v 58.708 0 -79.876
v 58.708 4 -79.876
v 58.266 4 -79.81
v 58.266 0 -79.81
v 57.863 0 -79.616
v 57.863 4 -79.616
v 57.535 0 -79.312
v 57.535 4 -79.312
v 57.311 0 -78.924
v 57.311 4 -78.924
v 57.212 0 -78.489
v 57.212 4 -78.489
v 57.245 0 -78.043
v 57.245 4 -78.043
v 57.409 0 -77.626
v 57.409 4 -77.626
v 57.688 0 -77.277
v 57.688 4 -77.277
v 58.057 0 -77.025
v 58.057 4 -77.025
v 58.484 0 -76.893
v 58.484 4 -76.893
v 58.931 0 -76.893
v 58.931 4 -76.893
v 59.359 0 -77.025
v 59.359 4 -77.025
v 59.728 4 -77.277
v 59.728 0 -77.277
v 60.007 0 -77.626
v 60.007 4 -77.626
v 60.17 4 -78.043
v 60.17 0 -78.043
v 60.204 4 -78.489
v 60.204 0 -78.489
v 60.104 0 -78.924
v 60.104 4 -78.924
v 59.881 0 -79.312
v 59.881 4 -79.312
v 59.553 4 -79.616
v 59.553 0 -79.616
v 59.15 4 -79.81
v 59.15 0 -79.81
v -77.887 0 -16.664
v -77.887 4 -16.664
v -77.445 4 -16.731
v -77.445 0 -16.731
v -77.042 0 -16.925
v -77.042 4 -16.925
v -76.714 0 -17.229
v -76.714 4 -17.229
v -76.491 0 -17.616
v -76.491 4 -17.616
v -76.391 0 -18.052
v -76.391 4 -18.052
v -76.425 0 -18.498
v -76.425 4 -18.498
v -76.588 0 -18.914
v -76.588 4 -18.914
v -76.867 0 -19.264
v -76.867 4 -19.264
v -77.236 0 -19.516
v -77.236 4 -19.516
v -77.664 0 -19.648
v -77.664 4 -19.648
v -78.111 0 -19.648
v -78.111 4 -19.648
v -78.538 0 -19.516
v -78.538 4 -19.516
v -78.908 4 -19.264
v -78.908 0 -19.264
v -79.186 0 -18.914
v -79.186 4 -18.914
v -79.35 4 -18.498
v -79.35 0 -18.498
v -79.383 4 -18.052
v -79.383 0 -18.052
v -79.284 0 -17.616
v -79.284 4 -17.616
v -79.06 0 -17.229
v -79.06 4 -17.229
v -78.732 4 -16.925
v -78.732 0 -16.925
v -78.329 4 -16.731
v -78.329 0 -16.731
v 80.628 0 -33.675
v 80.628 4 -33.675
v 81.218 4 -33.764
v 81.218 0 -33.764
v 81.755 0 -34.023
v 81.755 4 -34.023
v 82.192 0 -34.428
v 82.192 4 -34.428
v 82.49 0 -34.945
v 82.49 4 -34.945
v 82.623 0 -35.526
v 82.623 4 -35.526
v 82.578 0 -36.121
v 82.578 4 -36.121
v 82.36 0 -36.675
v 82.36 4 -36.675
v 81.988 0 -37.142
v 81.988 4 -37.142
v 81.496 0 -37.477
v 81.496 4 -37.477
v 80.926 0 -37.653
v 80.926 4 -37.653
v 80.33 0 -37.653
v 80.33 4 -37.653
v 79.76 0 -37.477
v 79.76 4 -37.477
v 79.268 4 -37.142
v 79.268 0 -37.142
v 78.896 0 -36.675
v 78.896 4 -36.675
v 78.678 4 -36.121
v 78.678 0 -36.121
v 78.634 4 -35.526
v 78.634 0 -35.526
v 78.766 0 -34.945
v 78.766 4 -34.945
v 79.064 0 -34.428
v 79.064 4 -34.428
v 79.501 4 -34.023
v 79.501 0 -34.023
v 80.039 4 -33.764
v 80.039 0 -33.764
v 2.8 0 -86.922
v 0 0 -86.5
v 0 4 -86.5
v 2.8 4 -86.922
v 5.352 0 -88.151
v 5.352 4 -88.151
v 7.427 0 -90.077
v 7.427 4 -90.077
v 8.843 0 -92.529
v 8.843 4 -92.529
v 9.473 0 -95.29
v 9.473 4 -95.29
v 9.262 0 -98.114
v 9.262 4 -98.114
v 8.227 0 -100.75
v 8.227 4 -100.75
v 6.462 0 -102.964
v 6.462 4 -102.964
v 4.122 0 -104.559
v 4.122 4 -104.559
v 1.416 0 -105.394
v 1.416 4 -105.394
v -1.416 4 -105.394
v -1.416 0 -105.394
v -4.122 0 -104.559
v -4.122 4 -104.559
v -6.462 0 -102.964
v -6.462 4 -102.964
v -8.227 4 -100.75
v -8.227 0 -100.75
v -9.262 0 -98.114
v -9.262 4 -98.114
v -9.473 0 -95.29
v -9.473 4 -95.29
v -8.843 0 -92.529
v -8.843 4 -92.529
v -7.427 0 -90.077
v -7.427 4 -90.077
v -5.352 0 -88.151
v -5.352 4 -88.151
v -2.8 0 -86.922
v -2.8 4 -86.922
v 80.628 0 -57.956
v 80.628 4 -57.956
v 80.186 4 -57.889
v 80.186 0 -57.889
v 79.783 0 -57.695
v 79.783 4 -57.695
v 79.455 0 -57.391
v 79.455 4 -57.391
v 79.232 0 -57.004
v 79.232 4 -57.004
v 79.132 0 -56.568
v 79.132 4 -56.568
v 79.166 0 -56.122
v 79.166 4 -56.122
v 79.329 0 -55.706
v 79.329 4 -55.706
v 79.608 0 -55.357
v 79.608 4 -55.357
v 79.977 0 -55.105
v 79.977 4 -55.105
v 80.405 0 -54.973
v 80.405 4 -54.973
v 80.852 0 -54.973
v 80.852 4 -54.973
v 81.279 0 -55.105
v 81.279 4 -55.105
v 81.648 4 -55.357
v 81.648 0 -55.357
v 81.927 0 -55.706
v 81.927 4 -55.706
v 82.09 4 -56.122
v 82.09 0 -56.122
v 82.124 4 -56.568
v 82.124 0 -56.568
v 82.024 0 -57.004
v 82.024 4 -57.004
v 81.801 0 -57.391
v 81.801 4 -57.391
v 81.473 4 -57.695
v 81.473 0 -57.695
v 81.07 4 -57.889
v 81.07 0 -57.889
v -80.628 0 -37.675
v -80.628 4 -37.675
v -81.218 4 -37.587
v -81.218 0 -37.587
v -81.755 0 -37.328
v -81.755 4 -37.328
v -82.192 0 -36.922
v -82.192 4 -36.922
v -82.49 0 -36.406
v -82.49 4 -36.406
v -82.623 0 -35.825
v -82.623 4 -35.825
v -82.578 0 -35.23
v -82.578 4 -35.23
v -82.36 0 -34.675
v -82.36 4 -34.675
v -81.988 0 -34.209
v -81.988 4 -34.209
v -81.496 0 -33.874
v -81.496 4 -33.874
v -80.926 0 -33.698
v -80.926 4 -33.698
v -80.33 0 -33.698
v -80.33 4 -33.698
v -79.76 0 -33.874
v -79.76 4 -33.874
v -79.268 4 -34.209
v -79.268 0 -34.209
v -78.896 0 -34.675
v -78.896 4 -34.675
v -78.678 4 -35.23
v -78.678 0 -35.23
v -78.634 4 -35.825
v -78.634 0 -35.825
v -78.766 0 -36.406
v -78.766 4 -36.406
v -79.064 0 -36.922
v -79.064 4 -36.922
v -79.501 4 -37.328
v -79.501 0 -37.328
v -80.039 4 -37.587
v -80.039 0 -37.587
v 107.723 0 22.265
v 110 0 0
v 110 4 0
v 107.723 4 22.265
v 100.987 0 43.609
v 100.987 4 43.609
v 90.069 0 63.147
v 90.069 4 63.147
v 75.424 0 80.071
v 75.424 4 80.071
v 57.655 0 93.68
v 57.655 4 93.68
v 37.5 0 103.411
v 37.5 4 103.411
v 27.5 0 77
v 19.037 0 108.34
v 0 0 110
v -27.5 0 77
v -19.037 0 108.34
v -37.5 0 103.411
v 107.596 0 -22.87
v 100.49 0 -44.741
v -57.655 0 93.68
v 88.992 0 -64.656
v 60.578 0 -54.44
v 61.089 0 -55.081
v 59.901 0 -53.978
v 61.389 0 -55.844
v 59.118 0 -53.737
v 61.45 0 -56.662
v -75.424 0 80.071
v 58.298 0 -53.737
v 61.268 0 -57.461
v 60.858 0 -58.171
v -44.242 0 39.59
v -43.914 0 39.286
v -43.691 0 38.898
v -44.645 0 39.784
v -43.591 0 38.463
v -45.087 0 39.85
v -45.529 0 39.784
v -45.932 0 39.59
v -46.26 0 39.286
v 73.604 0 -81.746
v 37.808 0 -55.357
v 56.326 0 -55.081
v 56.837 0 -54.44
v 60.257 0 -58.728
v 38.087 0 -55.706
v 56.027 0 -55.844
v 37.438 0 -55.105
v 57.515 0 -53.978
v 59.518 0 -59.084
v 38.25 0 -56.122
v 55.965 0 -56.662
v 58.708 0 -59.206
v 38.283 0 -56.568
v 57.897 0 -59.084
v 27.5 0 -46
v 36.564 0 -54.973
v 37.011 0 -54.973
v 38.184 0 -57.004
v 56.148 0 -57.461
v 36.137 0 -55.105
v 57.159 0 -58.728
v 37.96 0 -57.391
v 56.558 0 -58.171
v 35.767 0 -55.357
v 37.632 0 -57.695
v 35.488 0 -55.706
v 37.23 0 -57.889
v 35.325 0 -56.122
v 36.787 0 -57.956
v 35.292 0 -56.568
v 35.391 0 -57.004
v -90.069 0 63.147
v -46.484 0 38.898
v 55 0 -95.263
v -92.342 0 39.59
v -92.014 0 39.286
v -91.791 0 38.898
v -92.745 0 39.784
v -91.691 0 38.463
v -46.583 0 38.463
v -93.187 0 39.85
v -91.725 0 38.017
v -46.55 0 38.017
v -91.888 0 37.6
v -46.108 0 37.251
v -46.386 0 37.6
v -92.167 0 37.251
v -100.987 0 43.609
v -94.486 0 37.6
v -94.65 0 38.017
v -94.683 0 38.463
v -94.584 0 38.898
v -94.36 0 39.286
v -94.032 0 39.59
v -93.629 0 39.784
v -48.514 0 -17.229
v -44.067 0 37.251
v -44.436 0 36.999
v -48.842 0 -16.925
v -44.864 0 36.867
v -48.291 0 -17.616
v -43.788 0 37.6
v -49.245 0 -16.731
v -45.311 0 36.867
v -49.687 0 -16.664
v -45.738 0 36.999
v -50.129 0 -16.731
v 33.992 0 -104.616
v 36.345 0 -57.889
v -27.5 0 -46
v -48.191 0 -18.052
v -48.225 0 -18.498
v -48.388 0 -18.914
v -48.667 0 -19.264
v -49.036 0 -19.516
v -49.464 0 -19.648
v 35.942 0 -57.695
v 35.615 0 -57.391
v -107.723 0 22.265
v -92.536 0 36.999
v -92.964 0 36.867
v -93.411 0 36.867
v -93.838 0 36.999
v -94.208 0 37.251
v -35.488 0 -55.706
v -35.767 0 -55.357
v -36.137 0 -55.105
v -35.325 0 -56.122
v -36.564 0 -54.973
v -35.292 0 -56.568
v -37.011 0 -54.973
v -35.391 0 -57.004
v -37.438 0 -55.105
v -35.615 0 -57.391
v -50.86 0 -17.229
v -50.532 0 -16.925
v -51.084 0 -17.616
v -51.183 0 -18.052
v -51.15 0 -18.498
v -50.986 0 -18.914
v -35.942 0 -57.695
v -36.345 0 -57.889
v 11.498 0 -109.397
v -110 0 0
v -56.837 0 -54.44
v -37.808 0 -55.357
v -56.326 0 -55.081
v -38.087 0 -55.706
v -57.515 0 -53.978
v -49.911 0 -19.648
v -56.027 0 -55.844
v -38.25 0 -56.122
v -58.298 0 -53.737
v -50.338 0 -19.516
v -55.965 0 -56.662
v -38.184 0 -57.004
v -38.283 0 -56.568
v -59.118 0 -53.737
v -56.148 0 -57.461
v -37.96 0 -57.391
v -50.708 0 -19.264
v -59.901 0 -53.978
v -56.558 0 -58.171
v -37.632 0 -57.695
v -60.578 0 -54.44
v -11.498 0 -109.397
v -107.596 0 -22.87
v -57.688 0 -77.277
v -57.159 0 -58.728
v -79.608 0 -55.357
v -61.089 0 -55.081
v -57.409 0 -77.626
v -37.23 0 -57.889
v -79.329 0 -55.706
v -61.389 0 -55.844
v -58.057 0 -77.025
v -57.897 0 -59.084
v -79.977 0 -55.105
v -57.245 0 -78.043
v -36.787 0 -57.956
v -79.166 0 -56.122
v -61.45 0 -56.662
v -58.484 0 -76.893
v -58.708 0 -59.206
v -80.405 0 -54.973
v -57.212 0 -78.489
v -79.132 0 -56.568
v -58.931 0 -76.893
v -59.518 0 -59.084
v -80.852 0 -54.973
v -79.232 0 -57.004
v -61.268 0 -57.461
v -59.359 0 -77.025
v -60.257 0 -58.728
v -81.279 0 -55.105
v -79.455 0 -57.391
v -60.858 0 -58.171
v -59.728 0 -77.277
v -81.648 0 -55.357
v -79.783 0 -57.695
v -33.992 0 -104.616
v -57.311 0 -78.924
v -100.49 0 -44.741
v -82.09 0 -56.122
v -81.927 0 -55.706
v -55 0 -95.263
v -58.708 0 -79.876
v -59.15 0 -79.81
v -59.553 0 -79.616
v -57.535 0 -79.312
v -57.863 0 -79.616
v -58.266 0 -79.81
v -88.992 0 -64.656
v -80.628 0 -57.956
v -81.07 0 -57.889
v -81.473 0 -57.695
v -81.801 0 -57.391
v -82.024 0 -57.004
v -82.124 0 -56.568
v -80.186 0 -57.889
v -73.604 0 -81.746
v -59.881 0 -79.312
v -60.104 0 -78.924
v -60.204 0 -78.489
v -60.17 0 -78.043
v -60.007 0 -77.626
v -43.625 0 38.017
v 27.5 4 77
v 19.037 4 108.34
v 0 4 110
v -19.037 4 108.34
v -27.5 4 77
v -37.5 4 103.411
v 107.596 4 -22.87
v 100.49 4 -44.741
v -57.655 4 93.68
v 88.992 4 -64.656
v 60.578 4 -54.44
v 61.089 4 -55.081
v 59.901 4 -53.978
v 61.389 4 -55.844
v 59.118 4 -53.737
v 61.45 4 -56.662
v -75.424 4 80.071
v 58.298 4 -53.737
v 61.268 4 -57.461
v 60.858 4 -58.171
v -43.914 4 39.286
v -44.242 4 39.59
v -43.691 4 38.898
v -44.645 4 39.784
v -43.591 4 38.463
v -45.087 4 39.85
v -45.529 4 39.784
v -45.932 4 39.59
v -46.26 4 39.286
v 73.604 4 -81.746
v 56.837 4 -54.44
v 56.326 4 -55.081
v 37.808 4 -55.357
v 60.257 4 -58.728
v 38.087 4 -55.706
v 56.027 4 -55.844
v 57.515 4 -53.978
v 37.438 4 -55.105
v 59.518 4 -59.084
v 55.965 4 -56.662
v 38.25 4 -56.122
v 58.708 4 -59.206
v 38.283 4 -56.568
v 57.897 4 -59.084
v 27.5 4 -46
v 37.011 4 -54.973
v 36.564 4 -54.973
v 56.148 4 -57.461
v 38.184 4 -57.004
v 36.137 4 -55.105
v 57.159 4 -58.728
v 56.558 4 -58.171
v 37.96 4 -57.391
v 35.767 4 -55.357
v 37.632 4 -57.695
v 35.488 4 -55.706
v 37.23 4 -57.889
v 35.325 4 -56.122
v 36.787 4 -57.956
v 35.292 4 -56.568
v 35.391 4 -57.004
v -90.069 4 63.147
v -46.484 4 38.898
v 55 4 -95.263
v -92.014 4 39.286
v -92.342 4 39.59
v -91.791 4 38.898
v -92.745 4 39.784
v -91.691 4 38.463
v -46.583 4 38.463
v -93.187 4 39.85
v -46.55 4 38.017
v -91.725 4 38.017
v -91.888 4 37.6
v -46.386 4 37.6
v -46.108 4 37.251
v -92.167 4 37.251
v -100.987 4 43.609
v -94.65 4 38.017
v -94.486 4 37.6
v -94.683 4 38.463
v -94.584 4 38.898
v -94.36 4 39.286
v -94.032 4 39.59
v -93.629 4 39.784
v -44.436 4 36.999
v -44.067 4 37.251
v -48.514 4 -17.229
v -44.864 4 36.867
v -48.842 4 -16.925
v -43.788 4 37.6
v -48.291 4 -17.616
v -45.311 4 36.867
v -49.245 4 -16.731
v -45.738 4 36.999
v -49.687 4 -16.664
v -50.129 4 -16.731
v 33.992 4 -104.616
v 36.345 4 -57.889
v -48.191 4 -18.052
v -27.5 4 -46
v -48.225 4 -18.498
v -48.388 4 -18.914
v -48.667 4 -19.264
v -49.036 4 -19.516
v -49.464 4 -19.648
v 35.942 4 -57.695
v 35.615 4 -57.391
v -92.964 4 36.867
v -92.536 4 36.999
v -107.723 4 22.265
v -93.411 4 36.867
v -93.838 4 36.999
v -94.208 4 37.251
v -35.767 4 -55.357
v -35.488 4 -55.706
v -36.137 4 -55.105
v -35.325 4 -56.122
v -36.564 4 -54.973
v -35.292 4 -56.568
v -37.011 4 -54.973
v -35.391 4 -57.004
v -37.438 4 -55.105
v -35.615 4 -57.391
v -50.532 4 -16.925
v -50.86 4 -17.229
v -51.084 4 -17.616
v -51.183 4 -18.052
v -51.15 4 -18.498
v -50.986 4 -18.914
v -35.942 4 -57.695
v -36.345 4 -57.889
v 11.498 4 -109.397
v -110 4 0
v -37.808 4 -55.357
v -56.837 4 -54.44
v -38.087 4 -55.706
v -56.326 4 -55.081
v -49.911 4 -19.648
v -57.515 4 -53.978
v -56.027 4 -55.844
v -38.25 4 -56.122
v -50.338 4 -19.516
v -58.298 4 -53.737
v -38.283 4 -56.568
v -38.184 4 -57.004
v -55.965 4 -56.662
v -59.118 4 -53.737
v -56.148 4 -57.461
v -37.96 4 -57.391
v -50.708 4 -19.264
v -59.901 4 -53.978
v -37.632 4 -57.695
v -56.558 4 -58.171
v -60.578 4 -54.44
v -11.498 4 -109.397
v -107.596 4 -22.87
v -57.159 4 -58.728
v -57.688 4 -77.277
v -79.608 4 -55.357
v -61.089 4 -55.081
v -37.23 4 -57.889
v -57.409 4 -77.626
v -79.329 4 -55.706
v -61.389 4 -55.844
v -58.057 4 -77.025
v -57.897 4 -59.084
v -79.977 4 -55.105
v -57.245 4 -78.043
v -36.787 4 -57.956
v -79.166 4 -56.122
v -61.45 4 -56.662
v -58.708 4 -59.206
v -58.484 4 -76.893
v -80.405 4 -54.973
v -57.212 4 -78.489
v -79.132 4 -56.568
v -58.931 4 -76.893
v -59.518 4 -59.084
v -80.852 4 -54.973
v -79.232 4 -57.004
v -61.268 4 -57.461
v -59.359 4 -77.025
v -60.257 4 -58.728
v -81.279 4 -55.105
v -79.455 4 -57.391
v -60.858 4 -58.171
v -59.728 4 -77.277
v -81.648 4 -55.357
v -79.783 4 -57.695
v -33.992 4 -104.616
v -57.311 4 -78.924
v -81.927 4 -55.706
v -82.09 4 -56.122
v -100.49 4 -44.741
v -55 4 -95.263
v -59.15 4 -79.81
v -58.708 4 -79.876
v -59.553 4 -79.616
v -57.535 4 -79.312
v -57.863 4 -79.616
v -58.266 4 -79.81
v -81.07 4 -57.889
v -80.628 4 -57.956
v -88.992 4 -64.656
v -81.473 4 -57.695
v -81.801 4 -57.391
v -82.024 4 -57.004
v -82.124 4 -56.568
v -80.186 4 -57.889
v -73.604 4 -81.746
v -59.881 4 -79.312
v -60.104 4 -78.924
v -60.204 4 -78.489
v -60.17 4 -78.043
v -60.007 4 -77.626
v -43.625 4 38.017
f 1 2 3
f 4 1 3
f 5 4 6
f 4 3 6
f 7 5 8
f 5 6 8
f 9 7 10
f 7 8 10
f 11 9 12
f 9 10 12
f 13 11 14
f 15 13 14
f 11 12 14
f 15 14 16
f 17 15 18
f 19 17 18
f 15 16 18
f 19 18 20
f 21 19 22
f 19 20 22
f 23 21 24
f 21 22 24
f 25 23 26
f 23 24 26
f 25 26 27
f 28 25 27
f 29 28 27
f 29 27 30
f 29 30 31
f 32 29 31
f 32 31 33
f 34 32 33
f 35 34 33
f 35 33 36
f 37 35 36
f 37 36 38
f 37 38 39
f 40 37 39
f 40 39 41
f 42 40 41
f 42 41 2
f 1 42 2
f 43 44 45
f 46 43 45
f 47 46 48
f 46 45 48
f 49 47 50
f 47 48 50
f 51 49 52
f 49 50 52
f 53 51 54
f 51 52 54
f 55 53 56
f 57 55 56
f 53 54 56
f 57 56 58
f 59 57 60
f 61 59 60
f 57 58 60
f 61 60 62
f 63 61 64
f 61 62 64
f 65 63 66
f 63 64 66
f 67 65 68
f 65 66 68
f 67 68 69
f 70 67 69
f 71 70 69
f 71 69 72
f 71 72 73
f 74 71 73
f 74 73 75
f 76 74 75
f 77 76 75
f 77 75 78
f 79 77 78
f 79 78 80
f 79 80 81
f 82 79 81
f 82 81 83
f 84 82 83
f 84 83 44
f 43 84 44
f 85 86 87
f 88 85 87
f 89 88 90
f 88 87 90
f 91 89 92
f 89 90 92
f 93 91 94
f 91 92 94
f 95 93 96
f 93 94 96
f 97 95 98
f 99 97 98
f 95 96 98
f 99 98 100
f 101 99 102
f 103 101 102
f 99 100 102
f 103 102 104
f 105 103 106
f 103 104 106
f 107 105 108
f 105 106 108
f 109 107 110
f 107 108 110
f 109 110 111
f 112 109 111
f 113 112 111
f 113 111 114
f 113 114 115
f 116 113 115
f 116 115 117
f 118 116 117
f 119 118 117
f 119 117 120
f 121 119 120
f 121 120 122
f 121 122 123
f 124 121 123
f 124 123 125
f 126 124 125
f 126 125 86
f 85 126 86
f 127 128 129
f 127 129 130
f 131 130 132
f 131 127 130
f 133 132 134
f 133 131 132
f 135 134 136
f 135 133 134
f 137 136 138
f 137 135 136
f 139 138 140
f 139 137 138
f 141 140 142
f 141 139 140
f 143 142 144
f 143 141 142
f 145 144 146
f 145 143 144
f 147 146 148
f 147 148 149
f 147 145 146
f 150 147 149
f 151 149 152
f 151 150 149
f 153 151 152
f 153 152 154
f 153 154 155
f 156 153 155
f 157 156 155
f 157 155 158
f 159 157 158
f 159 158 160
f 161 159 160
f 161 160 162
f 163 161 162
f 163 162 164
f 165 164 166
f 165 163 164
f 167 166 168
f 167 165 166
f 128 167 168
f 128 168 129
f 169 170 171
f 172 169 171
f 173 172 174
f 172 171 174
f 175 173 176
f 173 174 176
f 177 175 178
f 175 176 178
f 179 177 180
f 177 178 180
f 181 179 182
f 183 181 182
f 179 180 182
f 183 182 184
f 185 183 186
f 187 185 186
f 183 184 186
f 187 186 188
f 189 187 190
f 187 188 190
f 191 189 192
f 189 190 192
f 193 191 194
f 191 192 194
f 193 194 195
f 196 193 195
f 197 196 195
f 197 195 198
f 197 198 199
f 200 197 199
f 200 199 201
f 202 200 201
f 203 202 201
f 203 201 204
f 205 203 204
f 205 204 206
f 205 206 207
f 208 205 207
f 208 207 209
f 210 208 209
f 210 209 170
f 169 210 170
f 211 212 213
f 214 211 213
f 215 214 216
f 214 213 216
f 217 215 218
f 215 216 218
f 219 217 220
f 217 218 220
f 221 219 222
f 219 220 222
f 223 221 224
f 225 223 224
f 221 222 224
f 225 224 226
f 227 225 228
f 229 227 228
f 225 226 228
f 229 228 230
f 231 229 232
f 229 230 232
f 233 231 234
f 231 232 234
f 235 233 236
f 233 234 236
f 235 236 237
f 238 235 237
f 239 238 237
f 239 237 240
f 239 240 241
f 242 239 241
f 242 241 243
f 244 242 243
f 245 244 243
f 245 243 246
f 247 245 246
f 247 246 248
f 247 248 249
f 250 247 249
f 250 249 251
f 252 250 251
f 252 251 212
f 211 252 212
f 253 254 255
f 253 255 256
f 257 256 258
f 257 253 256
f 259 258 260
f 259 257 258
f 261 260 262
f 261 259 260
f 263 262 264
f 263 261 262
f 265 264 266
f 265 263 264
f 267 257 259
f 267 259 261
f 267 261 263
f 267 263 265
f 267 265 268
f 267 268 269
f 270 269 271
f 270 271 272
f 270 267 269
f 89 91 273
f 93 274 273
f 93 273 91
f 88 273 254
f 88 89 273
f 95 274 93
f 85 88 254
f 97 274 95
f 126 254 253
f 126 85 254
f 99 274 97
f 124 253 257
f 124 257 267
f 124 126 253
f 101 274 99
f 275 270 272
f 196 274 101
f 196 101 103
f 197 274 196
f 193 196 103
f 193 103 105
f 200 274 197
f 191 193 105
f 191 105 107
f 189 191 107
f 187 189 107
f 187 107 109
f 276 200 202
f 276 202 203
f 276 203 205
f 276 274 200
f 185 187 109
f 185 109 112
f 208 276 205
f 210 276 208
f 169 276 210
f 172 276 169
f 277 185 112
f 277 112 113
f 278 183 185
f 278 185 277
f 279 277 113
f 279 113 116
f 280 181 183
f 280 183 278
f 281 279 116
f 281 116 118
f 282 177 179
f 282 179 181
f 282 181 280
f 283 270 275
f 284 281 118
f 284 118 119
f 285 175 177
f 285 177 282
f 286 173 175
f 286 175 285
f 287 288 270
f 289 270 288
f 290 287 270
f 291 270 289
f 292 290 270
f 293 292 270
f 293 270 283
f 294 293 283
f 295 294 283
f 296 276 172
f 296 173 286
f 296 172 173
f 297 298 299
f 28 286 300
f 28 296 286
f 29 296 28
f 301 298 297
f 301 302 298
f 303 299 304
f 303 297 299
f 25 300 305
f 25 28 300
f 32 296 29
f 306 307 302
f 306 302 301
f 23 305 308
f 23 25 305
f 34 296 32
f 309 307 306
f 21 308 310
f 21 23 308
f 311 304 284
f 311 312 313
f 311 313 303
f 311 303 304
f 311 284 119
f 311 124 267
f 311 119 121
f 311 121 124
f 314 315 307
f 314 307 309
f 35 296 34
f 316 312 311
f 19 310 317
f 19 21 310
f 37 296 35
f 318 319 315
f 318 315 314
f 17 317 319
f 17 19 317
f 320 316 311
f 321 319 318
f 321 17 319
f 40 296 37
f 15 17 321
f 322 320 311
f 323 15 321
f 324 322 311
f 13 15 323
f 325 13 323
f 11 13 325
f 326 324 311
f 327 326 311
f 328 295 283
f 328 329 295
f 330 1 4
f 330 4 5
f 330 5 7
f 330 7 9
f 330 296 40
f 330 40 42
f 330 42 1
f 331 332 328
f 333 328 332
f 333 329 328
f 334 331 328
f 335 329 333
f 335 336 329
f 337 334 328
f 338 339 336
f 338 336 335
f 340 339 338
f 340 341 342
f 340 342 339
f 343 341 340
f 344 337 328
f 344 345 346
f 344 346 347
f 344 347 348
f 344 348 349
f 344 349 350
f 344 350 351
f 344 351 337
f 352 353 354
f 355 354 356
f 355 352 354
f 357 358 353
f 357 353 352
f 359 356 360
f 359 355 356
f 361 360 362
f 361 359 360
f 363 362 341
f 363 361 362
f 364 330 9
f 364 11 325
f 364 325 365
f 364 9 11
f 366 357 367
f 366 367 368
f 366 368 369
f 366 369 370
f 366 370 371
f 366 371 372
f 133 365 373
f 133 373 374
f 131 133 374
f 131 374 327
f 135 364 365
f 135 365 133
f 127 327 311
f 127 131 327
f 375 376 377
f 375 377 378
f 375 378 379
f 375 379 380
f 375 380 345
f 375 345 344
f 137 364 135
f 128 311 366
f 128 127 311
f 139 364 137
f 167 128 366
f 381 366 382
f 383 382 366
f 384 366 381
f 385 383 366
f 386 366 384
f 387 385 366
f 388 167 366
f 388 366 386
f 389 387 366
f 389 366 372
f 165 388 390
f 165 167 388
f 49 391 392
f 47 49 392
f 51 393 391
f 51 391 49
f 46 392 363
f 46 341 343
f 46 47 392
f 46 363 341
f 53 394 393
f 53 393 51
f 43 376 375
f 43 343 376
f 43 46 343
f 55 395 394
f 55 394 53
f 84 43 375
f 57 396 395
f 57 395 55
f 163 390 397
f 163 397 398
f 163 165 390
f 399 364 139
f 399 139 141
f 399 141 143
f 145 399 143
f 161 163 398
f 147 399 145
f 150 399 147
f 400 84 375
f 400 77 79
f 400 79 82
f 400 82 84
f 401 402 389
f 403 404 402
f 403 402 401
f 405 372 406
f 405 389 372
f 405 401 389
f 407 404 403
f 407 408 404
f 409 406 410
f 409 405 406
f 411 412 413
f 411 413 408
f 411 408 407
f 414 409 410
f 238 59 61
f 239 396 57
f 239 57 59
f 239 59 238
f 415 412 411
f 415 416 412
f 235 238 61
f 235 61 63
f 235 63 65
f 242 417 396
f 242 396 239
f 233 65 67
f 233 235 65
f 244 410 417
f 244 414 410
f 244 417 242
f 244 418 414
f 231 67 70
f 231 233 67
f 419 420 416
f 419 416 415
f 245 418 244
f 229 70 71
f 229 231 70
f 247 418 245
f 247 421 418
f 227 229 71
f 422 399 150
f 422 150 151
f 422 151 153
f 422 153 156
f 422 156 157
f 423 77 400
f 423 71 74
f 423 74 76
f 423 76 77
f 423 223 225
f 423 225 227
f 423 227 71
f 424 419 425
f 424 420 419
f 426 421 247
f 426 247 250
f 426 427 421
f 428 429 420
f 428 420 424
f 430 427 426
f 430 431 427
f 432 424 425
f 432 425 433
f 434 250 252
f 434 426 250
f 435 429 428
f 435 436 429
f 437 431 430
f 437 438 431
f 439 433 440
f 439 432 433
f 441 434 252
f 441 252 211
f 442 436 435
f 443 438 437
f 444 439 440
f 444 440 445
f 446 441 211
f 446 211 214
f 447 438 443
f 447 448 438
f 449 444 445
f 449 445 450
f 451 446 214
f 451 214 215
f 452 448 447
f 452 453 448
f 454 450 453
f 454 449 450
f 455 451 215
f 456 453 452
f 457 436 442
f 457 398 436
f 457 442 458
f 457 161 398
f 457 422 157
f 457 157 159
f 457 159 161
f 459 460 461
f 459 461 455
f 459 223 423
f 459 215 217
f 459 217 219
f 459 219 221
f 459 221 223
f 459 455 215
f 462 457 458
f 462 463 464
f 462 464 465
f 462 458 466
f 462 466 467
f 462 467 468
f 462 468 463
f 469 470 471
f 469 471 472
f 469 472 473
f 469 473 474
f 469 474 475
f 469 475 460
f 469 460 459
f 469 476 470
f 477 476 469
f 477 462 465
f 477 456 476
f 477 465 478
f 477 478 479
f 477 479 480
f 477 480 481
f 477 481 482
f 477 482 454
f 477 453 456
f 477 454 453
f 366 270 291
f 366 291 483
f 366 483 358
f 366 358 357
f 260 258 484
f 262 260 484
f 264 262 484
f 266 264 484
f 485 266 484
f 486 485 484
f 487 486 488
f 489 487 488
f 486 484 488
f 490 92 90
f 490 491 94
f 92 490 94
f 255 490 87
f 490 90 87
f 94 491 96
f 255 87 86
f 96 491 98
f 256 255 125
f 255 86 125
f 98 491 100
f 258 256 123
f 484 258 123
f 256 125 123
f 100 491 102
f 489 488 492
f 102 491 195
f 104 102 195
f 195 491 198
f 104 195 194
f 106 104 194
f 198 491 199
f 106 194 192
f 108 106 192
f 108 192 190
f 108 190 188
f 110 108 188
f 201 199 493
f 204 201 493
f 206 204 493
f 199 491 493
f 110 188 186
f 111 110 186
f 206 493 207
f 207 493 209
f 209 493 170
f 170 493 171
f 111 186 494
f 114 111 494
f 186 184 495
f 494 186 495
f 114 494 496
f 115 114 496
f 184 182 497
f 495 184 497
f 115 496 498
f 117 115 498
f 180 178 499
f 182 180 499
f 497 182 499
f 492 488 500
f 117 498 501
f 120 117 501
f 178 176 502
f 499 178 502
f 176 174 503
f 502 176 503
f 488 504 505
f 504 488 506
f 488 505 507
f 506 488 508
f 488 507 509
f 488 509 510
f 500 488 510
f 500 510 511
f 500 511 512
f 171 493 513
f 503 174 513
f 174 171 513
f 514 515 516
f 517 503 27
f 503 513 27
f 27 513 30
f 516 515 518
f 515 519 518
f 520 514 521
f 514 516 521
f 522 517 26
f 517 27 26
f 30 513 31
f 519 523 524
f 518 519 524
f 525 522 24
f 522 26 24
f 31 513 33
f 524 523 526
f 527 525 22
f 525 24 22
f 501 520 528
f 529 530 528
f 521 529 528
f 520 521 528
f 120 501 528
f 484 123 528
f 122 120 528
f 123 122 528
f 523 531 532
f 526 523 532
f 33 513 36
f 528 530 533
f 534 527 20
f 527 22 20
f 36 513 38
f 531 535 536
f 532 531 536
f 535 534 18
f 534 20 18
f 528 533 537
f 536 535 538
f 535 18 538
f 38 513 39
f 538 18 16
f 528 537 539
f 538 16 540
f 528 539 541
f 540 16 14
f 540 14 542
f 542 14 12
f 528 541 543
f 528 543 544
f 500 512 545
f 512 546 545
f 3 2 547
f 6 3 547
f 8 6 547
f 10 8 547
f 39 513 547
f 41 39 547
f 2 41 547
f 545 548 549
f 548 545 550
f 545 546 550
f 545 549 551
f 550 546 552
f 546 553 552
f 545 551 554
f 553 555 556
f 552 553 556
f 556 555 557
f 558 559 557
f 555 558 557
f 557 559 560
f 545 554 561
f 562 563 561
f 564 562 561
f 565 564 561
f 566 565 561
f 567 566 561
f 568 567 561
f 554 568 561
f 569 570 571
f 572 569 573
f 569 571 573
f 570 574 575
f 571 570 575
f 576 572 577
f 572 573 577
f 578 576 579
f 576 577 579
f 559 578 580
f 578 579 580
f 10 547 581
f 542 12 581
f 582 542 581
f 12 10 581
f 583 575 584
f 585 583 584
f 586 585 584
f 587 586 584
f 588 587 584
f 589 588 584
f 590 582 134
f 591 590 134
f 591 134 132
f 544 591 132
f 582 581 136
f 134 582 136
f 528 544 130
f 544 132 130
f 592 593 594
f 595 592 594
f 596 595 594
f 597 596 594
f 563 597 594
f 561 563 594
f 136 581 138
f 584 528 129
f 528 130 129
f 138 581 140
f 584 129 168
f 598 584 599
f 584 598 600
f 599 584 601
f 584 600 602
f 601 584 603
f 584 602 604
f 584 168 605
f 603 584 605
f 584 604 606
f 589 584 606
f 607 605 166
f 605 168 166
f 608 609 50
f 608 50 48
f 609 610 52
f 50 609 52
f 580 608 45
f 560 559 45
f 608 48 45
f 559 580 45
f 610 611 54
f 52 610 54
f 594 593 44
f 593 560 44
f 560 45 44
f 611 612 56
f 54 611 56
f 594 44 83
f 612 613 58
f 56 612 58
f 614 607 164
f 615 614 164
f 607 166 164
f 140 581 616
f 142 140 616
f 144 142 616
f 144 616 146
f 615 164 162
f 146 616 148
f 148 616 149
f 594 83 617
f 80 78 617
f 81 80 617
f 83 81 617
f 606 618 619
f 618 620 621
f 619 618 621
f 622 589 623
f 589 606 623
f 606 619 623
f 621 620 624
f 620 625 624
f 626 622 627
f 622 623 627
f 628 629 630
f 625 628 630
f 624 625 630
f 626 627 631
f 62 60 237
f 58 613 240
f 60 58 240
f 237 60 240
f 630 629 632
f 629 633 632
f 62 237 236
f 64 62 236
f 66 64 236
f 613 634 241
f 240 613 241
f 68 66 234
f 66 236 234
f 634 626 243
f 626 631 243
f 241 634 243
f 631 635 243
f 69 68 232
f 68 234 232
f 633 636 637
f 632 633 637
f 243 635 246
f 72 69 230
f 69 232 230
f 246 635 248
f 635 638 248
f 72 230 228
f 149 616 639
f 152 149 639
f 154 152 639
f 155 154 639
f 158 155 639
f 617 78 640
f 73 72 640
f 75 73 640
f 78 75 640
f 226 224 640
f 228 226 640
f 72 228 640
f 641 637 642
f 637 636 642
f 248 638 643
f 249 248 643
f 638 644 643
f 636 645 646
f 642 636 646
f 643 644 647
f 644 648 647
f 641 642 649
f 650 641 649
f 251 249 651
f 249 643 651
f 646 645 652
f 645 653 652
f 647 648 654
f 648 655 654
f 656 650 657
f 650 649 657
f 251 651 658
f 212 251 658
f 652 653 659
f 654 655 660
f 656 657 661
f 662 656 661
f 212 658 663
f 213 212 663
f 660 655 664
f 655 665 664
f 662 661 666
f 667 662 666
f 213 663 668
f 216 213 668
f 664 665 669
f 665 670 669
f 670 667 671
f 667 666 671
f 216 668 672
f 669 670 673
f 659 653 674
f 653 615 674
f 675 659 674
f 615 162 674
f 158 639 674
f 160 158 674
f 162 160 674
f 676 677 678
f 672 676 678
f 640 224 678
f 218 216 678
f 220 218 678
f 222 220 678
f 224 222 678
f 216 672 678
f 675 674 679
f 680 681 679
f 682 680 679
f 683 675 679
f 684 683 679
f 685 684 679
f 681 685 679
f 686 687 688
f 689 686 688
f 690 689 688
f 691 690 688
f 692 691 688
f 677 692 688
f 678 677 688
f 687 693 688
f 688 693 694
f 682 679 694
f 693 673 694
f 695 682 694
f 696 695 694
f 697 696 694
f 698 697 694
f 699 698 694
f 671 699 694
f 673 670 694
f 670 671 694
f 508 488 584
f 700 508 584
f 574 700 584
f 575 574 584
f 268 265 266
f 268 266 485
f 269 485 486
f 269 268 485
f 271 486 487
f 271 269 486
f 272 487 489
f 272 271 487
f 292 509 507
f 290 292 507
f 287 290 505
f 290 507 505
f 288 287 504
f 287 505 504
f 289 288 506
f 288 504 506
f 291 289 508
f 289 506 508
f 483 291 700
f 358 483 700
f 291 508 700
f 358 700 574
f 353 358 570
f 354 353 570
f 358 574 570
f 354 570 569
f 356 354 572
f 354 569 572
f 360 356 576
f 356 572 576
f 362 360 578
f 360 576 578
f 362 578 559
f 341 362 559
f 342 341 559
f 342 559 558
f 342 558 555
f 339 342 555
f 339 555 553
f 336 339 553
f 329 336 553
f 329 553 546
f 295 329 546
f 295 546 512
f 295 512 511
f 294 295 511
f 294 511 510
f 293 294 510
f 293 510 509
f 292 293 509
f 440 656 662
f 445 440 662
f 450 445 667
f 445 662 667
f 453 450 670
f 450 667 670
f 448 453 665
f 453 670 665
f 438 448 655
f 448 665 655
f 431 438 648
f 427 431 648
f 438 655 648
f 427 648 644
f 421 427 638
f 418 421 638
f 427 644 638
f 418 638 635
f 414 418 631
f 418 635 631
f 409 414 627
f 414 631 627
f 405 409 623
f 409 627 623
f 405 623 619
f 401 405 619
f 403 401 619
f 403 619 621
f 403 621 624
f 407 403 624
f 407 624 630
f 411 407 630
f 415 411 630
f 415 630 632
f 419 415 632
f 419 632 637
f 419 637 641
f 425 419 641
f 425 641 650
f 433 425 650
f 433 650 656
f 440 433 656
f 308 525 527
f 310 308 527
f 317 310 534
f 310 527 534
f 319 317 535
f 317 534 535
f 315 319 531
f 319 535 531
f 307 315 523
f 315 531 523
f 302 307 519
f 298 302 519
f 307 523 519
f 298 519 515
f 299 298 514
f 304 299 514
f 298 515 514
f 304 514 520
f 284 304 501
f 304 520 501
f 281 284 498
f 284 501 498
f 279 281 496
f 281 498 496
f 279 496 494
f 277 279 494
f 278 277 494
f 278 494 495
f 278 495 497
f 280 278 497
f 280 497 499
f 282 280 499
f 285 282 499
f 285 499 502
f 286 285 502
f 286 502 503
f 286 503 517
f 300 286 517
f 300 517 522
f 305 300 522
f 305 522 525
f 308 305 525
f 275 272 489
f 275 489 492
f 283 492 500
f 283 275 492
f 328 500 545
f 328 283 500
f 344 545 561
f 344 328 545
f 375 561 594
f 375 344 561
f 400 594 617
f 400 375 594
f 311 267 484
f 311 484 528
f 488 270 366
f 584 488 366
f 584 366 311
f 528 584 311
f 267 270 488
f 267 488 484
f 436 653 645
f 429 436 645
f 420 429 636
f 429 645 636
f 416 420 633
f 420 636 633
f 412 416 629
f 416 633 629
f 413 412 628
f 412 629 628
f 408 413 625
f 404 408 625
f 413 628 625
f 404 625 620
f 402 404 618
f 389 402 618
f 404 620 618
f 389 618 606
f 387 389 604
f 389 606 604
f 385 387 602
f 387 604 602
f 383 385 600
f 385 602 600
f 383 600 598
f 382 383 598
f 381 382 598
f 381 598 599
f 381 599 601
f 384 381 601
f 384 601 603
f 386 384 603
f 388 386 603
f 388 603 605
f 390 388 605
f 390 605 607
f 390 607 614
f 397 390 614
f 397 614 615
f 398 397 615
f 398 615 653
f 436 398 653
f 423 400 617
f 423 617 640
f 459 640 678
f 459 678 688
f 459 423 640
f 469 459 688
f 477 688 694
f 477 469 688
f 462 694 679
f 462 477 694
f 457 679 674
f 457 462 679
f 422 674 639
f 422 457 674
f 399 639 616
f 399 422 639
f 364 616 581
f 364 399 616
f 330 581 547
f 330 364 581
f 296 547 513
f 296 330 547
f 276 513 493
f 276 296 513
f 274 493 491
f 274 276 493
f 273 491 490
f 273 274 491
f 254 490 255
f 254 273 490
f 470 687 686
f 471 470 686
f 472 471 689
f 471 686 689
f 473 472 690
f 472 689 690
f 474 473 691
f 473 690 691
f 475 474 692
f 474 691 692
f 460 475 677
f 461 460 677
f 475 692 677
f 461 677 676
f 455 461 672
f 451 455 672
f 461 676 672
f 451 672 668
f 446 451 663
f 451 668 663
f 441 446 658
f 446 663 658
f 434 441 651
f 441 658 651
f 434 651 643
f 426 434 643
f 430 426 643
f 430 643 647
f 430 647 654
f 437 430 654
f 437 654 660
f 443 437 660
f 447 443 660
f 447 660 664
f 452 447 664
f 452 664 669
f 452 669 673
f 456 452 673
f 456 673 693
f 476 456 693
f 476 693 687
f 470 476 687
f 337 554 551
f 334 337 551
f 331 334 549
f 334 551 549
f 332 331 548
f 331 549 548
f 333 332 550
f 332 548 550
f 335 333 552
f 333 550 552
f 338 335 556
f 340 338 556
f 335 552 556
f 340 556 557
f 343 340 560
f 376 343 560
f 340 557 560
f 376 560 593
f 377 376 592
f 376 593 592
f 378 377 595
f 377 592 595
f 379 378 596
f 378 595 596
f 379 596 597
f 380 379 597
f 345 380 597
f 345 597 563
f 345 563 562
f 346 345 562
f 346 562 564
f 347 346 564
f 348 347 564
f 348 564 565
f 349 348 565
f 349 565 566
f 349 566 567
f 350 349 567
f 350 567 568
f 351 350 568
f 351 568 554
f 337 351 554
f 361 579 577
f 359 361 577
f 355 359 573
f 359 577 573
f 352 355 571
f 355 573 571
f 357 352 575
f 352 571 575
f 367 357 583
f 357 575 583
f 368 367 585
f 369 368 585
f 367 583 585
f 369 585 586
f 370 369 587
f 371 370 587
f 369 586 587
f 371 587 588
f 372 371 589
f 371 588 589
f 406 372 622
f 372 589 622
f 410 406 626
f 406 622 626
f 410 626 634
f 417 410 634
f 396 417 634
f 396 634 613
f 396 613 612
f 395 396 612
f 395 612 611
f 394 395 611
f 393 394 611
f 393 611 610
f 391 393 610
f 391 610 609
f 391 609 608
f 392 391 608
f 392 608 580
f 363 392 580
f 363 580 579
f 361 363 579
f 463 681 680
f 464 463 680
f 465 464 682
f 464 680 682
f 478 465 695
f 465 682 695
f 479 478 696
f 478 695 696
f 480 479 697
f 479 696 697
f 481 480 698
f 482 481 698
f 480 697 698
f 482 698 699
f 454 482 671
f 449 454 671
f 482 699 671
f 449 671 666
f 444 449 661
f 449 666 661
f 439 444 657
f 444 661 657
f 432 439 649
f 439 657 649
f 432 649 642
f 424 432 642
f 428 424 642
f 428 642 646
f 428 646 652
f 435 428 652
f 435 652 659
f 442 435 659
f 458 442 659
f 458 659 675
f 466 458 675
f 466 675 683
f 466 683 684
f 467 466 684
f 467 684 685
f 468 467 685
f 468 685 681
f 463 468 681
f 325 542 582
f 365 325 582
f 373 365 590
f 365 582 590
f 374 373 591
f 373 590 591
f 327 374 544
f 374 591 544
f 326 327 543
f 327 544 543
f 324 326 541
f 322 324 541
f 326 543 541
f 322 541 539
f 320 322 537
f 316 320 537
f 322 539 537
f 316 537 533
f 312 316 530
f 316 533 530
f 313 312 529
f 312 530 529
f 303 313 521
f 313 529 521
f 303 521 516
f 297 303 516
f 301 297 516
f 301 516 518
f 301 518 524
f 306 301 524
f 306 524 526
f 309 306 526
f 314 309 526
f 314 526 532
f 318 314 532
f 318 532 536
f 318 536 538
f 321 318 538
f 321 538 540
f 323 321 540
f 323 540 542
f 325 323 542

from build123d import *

# Parameters (mm, degrees)
SKETCH1_R                        = 9.5
SKETCH1_W                        = 55
SKETCH1_H                        = 123
FOND_DEPTH                       = 4
TROUS_STEPPERS_REACH             = 157.615
SKETCH5_R                        = 1.5
SKETCH5_R_2                      = 2.75
TROUS_STEPPERS_DIRECTION_2_DEPTH = 156.614909311
TROUS_POULIES_REACH              = 157.615
SKETCH7_R                        = 2
TROUS_CARTE_REACH                = 157.615
SKETCH9_R                        = 1.5


with BuildPart() as part:
    # Sketch1 → fond (new body)
    with BuildSketch(Plane(origin=(0, 0, 0), x_dir=(1, 0, 0), z_dir=(0, 1, 0))):
        with BuildLine():
            ThreePointArc((-110, 0), (0, 110), (110, 0))
            ThreePointArc((110, 0), (90.069417673, -63.146654702), (37.5, -103.4105894))
            ThreePointArc((37.5, -103.4105894), (0, -110), (-37.5, -103.4105894))
            ThreePointArc((-37.5, -103.4105894), (-90.069417673, -63.146654702), (-110, 0))
        make_face()
        with Locations(Location((0, 96, 0), (0, 0, 270))):
            Circle(SKETCH1_R, mode=Mode.SUBTRACT)
        with Locations((0, -15.5)):
            Rectangle(SKETCH1_W, SKETCH1_H, mode=Mode.SUBTRACT)
    extrude(amount=FOND_DEPTH)

    # Sketch5 → trous steppers (cut, up to next)
    with BuildSketch(Plane(origin=(0, 4, 0), x_dir=(1, 0, 0), z_dir=(0, 1, 0)), mode=Mode.PRIVATE) as trous_steppers_sk1:
        with Locations(Location((36.787473029, 56.456130336, 0), (0, 0, 90))):
            Circle(SKETCH5_R)
    trous_steppers_tool1 = extrude(trous_steppers_sk1.sketch, amount=-TROUS_STEPPERS_REACH, mode=Mode.PRIVATE) & part.part
    # Sketch5 → trous steppers (cut, up to next)
    with BuildSketch(Plane(origin=(0, 4, 0), x_dir=(1, 0, 0), z_dir=(0, 1, 0)), mode=Mode.PRIVATE) as trous_steppers_sk2:
        with Locations(Location((58.707783245, 78.376440552, 0), (0, 0, 90))):
            Circle(SKETCH5_R)
    trous_steppers_tool2 = extrude(trous_steppers_sk2.sketch, amount=-TROUS_STEPPERS_REACH, mode=Mode.PRIVATE) & part.part
    # Sketch5 → trous steppers (cut, up to next)
    with BuildSketch(Plane(origin=(0, 4, 0), x_dir=(1, 0, 0), z_dir=(0, 1, 0)), mode=Mode.PRIVATE) as trous_steppers_sk3:
        with Locations(Location((80.628093462, 56.456130336, 0), (0, 0, 90))):
            Circle(SKETCH5_R)
    trous_steppers_tool3 = extrude(trous_steppers_sk3.sketch, amount=-TROUS_STEPPERS_REACH, mode=Mode.PRIVATE) & part.part
    # Sketch5 → trous steppers (cut, up to next)
    with BuildSketch(Plane(origin=(0, 4, 0), x_dir=(1, 0, 0), z_dir=(0, 1, 0)), mode=Mode.PRIVATE) as trous_steppers_sk4:
        with Locations(Location((-80.628093462, 56.456130336, 0), (0, 0, 90))):
            Circle(SKETCH5_R)
    trous_steppers_tool4 = extrude(trous_steppers_sk4.sketch, amount=-TROUS_STEPPERS_REACH, mode=Mode.PRIVATE) & part.part
    # Sketch5 → trous steppers (cut, up to next)
    with BuildSketch(Plane(origin=(0, 4, 0), x_dir=(1, 0, 0), z_dir=(0, 1, 0)), mode=Mode.PRIVATE) as trous_steppers_sk5:
        with Locations(Location((-58.707783245, 78.376440552, 0), (0, 0, 90))):
            Circle(SKETCH5_R)
    trous_steppers_tool5 = extrude(trous_steppers_sk5.sketch, amount=-TROUS_STEPPERS_REACH, mode=Mode.PRIVATE) & part.part
    # Sketch5 → trous steppers (cut, up to next)
    with BuildSketch(Plane(origin=(0, 4, 0), x_dir=(1, 0, 0), z_dir=(0, 1, 0)), mode=Mode.PRIVATE) as trous_steppers_sk6:
        with Locations(Location((-36.787473029, 56.456130336, 0), (0, 0, 90))):
            Circle(SKETCH5_R)
    trous_steppers_tool6 = extrude(trous_steppers_sk6.sketch, amount=-TROUS_STEPPERS_REACH, mode=Mode.PRIVATE) & part.part
    # Sketch5 → trous steppers (cut, up to next)
    with BuildSketch(Plane(origin=(0, 4, 0), x_dir=(1, 0, 0), z_dir=(0, 1, 0)), mode=Mode.PRIVATE) as trous_steppers_sk7:
        with Locations(Location((58.707783245, 56.456130336, 0), (0, 0, 90))):
            Circle(SKETCH5_R_2)
    trous_steppers_tool7 = extrude(trous_steppers_sk7.sketch, amount=-TROUS_STEPPERS_REACH, mode=Mode.PRIVATE) & part.part
    # Sketch5 → trous steppers (cut, up to next)
    with BuildSketch(Plane(origin=(0, 4, 0), x_dir=(1, 0, 0), z_dir=(0, 1, 0)), mode=Mode.PRIVATE) as trous_steppers_sk8:
        with Locations(Location((-58.707783245, 56.456130336, 0), (0, 0, 90))):
            Circle(SKETCH5_R_2)
    trous_steppers_tool8 = extrude(trous_steppers_sk8.sketch, amount=-TROUS_STEPPERS_REACH, mode=Mode.PRIVATE) & part.part
    add(trous_steppers_tool1.solids().sort_by_distance((36.787473, 4, -56.45613))[0], mode=Mode.SUBTRACT)
    add(trous_steppers_tool2.solids().sort_by_distance((58.707783, 4, -78.376441))[0], mode=Mode.SUBTRACT)
    add(trous_steppers_tool3.solids().sort_by_distance((80.628093, 4, -56.45613))[0], mode=Mode.SUBTRACT)
    add(trous_steppers_tool4.solids().sort_by_distance((-80.628093, 4, -56.45613))[0], mode=Mode.SUBTRACT)
    add(trous_steppers_tool5.solids().sort_by_distance((-58.707783, 4, -78.376441))[0], mode=Mode.SUBTRACT)
    add(trous_steppers_tool6.solids().sort_by_distance((-36.787473, 4, -56.45613))[0], mode=Mode.SUBTRACT)
    add(trous_steppers_tool7.solids().sort_by_distance((58.707783, 4, -56.45613))[0], mode=Mode.SUBTRACT)
    add(trous_steppers_tool8.solids().sort_by_distance((-58.707783, 4, -56.45613))[0], mode=Mode.SUBTRACT)

    # Sketch5 → trous steppers direction 2 (cut)
    with BuildSketch(Plane(origin=(0, 4, 0), x_dir=(1, 0, 0), z_dir=(0, 1, 0))):
        with Locations(Location((36.787473029, 56.456130336, 0), (0, 0, 90))):
            Circle(SKETCH5_R)
        with Locations(Location((58.707783245, 78.376440552, 0), (0, 0, 90))):
            Circle(SKETCH5_R)
        with Locations(Location((80.628093462, 56.456130336, 0), (0, 0, 90))):
            Circle(SKETCH5_R)
        with Locations(Location((-80.628093462, 56.456130336, 0), (0, 0, 90))):
            Circle(SKETCH5_R)
        with Locations(Location((-58.707783245, 78.376440552, 0), (0, 0, 90))):
            Circle(SKETCH5_R)
        with Locations(Location((-36.787473029, 56.456130336, 0), (0, 0, 90))):
            Circle(SKETCH5_R)
        with Locations(Location((58.707783245, 56.456130336, 0), (0, 0, 90))):
            Circle(SKETCH5_R_2)
        with Locations(Location((-58.707783245, 56.456130336, 0), (0, 0, 90))):
            Circle(SKETCH5_R_2)
    extrude(amount=TROUS_STEPPERS_DIRECTION_2_DEPTH, mode=Mode.SUBTRACT)

    # Sketch7 → trous poulies (cut, up to next)
    with BuildSketch(Plane(origin=(0, 4, 0), x_dir=(1, 0, 0), z_dir=(0, 1, 0)), mode=Mode.PRIVATE) as trous_poulies_sk1:
        with Locations(Location((80.628093462, 35.675463443, 0), (0, 0, 270))):
            Circle(SKETCH7_R)
    trous_poulies_tool1 = extrude(trous_poulies_sk1.sketch, amount=-TROUS_POULIES_REACH, mode=Mode.PRIVATE) & part.part
    # Sketch7 → trous poulies (cut, up to next)
    with BuildSketch(Plane(origin=(0, 4, 0), x_dir=(1, 0, 0), z_dir=(0, 1, 0)), mode=Mode.PRIVATE) as trous_poulies_sk2:
        with Locations(Location((-80.628093462, 35.675463443, 0), (0, 0, 90))):
            Circle(SKETCH7_R)
    trous_poulies_tool2 = extrude(trous_poulies_sk2.sketch, amount=-TROUS_POULIES_REACH, mode=Mode.PRIVATE) & part.part
    add(trous_poulies_tool1.solids().sort_by_distance((80.628093, 4, -35.675463))[0], mode=Mode.SUBTRACT)
    add(trous_poulies_tool2.solids().sort_by_distance((-80.628093, 4, -35.675463))[0], mode=Mode.SUBTRACT)

    # Sketch9 → trous carte (cut, up to next)
    with BuildSketch(Plane(origin=(0, 4, 0), x_dir=(1, 0, 0), z_dir=(0, 1, 0)), mode=Mode.PRIVATE) as trous_carte_sk1:
        with Locations(Location((-49.687242847, 18.164395088, 0), (0, 0, 270))):
            Circle(SKETCH9_R)
    trous_carte_tool1 = extrude(trous_carte_sk1.sketch, amount=-TROUS_CARTE_REACH, mode=Mode.PRIVATE) & part.part
    # Sketch9 → trous carte (cut, up to next)
    with BuildSketch(Plane(origin=(0, 4, 0), x_dir=(1, 0, 0), z_dir=(0, 1, 0)), mode=Mode.PRIVATE) as trous_carte_sk2:
        with Locations(Location((-77.887242847, 18.164395088, 0), (0, 0, 270))):
            Circle(SKETCH9_R)
    trous_carte_tool2 = extrude(trous_carte_sk2.sketch, amount=-TROUS_CARTE_REACH, mode=Mode.PRIVATE) & part.part
    # Sketch9 → trous carte (cut, up to next)
    with BuildSketch(Plane(origin=(0, 4, 0), x_dir=(1, 0, 0), z_dir=(0, 1, 0)), mode=Mode.PRIVATE) as trous_carte_sk3:
        with Locations(Location((-93.187242847, -38.350487124, 0), (0, 0, 270))):
            Circle(SKETCH9_R)
    trous_carte_tool3 = extrude(trous_carte_sk3.sketch, amount=-TROUS_CARTE_REACH, mode=Mode.PRIVATE) & part.part
    # Sketch9 → trous carte (cut, up to next)
    with BuildSketch(Plane(origin=(0, 4, 0), x_dir=(1, 0, 0), z_dir=(0, 1, 0)), mode=Mode.PRIVATE) as trous_carte_sk4:
        with Locations(Location((-45.087242847, -38.350487124, 0), (0, 0, 270))):
            Circle(SKETCH9_R)
    trous_carte_tool4 = extrude(trous_carte_sk4.sketch, amount=-TROUS_CARTE_REACH, mode=Mode.PRIVATE) & part.part
    add(trous_carte_tool1.solids().sort_by_distance((-49.687243, 4, -18.164395))[0], mode=Mode.SUBTRACT)
    add(trous_carte_tool2.solids().sort_by_distance((-77.887243, 4, -18.164395))[0], mode=Mode.SUBTRACT)
    add(trous_carte_tool3.solids().sort_by_distance((-93.187243, 4, 38.350487))[0], mode=Mode.SUBTRACT)
    add(trous_carte_tool4.solids().sort_by_distance((-45.087243, 4, 38.350487))[0], mode=Mode.SUBTRACT)


solid = part.part
